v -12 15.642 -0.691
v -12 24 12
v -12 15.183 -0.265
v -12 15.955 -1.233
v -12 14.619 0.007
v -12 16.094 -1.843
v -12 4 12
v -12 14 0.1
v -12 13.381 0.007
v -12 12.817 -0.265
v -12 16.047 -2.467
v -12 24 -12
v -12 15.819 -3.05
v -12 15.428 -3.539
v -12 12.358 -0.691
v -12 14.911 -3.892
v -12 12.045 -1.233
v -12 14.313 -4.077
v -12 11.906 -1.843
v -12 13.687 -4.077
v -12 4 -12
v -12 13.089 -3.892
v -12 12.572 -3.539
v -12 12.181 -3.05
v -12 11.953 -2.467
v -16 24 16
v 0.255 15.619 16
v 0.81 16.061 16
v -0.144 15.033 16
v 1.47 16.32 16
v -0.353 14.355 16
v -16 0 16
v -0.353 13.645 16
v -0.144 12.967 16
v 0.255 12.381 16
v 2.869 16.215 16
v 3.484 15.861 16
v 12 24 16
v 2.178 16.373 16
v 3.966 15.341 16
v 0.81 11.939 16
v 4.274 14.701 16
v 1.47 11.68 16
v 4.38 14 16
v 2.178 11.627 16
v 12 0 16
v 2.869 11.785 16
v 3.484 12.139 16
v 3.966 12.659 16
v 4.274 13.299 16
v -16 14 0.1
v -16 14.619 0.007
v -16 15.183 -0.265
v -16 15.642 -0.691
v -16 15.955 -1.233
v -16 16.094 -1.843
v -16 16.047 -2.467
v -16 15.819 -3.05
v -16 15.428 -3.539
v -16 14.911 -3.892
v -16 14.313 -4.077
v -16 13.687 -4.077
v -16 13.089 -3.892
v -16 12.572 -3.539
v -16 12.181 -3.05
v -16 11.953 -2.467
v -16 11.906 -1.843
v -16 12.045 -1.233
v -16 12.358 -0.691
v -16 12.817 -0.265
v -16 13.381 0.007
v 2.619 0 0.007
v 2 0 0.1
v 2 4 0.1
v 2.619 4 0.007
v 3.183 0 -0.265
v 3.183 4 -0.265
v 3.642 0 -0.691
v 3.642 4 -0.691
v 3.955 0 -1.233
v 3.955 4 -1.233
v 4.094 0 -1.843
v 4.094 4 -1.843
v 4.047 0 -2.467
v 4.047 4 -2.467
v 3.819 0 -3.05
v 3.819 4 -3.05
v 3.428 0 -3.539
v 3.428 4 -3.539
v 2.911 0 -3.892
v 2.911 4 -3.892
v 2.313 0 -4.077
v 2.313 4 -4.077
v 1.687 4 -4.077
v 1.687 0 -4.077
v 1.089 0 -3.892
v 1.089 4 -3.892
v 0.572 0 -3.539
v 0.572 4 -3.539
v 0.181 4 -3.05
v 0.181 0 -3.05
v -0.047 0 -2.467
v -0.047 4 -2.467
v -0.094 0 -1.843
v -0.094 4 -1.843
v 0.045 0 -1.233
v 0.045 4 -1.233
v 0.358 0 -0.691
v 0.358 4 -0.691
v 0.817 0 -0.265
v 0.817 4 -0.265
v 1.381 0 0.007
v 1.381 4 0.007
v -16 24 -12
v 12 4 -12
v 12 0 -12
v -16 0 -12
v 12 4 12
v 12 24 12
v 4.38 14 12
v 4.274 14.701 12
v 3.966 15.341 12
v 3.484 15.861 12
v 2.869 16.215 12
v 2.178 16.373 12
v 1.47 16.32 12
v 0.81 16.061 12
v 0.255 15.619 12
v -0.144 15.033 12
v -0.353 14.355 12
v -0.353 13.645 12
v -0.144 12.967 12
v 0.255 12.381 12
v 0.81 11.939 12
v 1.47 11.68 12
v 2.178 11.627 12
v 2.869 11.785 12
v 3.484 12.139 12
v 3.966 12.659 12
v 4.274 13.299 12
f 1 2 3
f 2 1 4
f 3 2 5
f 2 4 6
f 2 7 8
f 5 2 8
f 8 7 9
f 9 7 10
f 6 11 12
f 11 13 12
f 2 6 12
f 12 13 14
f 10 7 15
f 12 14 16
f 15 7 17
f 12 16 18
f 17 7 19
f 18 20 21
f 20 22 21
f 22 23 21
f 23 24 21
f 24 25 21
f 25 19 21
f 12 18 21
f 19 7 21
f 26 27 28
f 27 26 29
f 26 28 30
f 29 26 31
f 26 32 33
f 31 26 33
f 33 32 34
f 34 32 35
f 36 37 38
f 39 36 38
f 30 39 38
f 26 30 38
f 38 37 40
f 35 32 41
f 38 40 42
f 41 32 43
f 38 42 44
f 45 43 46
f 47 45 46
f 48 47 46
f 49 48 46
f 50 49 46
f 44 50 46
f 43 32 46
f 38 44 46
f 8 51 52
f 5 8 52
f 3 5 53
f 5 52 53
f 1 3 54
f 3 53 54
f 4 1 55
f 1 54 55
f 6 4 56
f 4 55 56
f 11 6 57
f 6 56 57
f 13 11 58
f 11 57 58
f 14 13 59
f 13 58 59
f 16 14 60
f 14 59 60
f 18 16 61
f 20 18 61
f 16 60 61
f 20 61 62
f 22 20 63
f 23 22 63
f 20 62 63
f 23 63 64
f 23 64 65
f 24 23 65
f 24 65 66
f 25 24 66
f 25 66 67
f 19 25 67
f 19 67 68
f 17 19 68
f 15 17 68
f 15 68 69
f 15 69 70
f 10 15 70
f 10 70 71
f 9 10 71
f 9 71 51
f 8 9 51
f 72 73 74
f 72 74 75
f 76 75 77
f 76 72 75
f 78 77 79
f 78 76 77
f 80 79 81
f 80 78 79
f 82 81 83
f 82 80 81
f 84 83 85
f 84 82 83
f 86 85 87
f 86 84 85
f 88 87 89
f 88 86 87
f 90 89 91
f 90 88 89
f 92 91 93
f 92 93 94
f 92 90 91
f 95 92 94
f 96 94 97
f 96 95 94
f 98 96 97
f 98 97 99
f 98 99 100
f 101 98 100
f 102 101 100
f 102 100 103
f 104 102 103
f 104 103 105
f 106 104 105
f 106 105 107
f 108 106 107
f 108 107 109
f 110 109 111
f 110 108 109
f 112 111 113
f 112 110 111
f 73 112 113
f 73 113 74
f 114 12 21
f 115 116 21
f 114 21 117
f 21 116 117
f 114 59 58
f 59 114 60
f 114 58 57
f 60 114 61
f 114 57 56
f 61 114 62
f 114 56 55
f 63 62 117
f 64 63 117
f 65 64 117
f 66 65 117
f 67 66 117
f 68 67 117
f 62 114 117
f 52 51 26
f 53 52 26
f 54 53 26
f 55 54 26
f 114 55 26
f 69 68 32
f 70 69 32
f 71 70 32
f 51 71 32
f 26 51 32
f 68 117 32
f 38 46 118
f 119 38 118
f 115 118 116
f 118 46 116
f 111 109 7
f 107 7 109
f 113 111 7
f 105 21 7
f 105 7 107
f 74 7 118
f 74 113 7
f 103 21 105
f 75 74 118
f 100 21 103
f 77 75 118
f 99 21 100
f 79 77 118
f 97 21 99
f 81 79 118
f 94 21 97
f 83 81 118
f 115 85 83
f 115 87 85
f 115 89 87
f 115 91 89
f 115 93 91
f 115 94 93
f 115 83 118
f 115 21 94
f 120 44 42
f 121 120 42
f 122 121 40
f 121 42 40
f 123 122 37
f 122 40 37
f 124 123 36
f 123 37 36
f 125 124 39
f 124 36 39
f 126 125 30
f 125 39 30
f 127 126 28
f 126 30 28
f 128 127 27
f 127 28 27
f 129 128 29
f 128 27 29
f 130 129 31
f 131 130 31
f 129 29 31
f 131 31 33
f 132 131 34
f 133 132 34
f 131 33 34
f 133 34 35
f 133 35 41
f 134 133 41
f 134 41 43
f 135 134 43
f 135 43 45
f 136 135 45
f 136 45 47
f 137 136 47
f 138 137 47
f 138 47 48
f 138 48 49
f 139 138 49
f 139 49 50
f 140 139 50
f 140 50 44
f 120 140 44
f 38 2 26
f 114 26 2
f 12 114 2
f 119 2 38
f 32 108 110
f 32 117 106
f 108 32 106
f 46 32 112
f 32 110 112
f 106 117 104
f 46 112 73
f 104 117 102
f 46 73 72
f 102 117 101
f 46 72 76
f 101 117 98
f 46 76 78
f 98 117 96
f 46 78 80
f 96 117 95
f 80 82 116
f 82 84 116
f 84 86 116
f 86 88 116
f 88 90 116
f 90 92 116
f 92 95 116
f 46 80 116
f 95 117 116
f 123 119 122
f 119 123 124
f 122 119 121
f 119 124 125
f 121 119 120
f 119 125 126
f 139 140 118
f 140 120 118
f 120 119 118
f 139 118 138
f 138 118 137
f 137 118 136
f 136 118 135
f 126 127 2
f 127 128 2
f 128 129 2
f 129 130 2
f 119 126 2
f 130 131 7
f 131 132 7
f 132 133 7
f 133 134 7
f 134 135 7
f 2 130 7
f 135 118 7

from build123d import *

# Parameters (mm, degrees)
SKETCH_1_W          = 24
SKETCH_1_H          = 24
SKETCH_1_R          = 2.1
EXTRUDE_1_DEPTH     = 4
EXTRUDE_2_DEPTH     = 24
SKETCH_2_R          = 2.379936998
CUT_EXTRUDE_1_DEPTH = 41.199502484
SKETCH_3_R          = 2.1
CUT_EXTRUDE_2_DEPTH = 41.199502484


with BuildPart() as part:
    # 草图1 → 凸台-拉伸1 (new body)
    with BuildSketch(Plane(origin=(0, 0, 0), x_dir=(1, 0, 0), z_dir=(0, 1, 0))):
        Rectangle(SKETCH_1_W, SKETCH_1_H)
        with Locations((2, 2)):
            Circle(SKETCH_1_R, mode=Mode.SUBTRACT)
    extrude(amount=EXTRUDE_1_DEPTH)

    # 草图1<3> → 凸台-拉伸2 (add)
    with BuildSketch(Plane(origin=(0, 0, 0), x_dir=(1, 0, 0), z_dir=(0, 1, 0))):
        Polygon((-12, -12), (-12, 12), (-16, 12), (-16, -16), (12, -16), (12, -12), align=None)
    extrude(amount=EXTRUDE_2_DEPTH)

    # 草图2 → 切除-拉伸1 (cut, through all)
    with BuildSketch(Plane.XY.offset(16)):
        with Locations((2, 14)):
            Circle(SKETCH_2_R)
    extrude(amount=-CUT_EXTRUDE_1_DEPTH, mode=Mode.SUBTRACT)

    # 草图3 → 切除-拉伸2 (cut, through all)
    with BuildSketch(Plane.ZY.offset(16)):
        with Locations((-2, 14)):
            Circle(SKETCH_3_R)
    extrude(amount=-CUT_EXTRUDE_2_DEPTH, mode=Mode.SUBTRACT)


solid = part.part
